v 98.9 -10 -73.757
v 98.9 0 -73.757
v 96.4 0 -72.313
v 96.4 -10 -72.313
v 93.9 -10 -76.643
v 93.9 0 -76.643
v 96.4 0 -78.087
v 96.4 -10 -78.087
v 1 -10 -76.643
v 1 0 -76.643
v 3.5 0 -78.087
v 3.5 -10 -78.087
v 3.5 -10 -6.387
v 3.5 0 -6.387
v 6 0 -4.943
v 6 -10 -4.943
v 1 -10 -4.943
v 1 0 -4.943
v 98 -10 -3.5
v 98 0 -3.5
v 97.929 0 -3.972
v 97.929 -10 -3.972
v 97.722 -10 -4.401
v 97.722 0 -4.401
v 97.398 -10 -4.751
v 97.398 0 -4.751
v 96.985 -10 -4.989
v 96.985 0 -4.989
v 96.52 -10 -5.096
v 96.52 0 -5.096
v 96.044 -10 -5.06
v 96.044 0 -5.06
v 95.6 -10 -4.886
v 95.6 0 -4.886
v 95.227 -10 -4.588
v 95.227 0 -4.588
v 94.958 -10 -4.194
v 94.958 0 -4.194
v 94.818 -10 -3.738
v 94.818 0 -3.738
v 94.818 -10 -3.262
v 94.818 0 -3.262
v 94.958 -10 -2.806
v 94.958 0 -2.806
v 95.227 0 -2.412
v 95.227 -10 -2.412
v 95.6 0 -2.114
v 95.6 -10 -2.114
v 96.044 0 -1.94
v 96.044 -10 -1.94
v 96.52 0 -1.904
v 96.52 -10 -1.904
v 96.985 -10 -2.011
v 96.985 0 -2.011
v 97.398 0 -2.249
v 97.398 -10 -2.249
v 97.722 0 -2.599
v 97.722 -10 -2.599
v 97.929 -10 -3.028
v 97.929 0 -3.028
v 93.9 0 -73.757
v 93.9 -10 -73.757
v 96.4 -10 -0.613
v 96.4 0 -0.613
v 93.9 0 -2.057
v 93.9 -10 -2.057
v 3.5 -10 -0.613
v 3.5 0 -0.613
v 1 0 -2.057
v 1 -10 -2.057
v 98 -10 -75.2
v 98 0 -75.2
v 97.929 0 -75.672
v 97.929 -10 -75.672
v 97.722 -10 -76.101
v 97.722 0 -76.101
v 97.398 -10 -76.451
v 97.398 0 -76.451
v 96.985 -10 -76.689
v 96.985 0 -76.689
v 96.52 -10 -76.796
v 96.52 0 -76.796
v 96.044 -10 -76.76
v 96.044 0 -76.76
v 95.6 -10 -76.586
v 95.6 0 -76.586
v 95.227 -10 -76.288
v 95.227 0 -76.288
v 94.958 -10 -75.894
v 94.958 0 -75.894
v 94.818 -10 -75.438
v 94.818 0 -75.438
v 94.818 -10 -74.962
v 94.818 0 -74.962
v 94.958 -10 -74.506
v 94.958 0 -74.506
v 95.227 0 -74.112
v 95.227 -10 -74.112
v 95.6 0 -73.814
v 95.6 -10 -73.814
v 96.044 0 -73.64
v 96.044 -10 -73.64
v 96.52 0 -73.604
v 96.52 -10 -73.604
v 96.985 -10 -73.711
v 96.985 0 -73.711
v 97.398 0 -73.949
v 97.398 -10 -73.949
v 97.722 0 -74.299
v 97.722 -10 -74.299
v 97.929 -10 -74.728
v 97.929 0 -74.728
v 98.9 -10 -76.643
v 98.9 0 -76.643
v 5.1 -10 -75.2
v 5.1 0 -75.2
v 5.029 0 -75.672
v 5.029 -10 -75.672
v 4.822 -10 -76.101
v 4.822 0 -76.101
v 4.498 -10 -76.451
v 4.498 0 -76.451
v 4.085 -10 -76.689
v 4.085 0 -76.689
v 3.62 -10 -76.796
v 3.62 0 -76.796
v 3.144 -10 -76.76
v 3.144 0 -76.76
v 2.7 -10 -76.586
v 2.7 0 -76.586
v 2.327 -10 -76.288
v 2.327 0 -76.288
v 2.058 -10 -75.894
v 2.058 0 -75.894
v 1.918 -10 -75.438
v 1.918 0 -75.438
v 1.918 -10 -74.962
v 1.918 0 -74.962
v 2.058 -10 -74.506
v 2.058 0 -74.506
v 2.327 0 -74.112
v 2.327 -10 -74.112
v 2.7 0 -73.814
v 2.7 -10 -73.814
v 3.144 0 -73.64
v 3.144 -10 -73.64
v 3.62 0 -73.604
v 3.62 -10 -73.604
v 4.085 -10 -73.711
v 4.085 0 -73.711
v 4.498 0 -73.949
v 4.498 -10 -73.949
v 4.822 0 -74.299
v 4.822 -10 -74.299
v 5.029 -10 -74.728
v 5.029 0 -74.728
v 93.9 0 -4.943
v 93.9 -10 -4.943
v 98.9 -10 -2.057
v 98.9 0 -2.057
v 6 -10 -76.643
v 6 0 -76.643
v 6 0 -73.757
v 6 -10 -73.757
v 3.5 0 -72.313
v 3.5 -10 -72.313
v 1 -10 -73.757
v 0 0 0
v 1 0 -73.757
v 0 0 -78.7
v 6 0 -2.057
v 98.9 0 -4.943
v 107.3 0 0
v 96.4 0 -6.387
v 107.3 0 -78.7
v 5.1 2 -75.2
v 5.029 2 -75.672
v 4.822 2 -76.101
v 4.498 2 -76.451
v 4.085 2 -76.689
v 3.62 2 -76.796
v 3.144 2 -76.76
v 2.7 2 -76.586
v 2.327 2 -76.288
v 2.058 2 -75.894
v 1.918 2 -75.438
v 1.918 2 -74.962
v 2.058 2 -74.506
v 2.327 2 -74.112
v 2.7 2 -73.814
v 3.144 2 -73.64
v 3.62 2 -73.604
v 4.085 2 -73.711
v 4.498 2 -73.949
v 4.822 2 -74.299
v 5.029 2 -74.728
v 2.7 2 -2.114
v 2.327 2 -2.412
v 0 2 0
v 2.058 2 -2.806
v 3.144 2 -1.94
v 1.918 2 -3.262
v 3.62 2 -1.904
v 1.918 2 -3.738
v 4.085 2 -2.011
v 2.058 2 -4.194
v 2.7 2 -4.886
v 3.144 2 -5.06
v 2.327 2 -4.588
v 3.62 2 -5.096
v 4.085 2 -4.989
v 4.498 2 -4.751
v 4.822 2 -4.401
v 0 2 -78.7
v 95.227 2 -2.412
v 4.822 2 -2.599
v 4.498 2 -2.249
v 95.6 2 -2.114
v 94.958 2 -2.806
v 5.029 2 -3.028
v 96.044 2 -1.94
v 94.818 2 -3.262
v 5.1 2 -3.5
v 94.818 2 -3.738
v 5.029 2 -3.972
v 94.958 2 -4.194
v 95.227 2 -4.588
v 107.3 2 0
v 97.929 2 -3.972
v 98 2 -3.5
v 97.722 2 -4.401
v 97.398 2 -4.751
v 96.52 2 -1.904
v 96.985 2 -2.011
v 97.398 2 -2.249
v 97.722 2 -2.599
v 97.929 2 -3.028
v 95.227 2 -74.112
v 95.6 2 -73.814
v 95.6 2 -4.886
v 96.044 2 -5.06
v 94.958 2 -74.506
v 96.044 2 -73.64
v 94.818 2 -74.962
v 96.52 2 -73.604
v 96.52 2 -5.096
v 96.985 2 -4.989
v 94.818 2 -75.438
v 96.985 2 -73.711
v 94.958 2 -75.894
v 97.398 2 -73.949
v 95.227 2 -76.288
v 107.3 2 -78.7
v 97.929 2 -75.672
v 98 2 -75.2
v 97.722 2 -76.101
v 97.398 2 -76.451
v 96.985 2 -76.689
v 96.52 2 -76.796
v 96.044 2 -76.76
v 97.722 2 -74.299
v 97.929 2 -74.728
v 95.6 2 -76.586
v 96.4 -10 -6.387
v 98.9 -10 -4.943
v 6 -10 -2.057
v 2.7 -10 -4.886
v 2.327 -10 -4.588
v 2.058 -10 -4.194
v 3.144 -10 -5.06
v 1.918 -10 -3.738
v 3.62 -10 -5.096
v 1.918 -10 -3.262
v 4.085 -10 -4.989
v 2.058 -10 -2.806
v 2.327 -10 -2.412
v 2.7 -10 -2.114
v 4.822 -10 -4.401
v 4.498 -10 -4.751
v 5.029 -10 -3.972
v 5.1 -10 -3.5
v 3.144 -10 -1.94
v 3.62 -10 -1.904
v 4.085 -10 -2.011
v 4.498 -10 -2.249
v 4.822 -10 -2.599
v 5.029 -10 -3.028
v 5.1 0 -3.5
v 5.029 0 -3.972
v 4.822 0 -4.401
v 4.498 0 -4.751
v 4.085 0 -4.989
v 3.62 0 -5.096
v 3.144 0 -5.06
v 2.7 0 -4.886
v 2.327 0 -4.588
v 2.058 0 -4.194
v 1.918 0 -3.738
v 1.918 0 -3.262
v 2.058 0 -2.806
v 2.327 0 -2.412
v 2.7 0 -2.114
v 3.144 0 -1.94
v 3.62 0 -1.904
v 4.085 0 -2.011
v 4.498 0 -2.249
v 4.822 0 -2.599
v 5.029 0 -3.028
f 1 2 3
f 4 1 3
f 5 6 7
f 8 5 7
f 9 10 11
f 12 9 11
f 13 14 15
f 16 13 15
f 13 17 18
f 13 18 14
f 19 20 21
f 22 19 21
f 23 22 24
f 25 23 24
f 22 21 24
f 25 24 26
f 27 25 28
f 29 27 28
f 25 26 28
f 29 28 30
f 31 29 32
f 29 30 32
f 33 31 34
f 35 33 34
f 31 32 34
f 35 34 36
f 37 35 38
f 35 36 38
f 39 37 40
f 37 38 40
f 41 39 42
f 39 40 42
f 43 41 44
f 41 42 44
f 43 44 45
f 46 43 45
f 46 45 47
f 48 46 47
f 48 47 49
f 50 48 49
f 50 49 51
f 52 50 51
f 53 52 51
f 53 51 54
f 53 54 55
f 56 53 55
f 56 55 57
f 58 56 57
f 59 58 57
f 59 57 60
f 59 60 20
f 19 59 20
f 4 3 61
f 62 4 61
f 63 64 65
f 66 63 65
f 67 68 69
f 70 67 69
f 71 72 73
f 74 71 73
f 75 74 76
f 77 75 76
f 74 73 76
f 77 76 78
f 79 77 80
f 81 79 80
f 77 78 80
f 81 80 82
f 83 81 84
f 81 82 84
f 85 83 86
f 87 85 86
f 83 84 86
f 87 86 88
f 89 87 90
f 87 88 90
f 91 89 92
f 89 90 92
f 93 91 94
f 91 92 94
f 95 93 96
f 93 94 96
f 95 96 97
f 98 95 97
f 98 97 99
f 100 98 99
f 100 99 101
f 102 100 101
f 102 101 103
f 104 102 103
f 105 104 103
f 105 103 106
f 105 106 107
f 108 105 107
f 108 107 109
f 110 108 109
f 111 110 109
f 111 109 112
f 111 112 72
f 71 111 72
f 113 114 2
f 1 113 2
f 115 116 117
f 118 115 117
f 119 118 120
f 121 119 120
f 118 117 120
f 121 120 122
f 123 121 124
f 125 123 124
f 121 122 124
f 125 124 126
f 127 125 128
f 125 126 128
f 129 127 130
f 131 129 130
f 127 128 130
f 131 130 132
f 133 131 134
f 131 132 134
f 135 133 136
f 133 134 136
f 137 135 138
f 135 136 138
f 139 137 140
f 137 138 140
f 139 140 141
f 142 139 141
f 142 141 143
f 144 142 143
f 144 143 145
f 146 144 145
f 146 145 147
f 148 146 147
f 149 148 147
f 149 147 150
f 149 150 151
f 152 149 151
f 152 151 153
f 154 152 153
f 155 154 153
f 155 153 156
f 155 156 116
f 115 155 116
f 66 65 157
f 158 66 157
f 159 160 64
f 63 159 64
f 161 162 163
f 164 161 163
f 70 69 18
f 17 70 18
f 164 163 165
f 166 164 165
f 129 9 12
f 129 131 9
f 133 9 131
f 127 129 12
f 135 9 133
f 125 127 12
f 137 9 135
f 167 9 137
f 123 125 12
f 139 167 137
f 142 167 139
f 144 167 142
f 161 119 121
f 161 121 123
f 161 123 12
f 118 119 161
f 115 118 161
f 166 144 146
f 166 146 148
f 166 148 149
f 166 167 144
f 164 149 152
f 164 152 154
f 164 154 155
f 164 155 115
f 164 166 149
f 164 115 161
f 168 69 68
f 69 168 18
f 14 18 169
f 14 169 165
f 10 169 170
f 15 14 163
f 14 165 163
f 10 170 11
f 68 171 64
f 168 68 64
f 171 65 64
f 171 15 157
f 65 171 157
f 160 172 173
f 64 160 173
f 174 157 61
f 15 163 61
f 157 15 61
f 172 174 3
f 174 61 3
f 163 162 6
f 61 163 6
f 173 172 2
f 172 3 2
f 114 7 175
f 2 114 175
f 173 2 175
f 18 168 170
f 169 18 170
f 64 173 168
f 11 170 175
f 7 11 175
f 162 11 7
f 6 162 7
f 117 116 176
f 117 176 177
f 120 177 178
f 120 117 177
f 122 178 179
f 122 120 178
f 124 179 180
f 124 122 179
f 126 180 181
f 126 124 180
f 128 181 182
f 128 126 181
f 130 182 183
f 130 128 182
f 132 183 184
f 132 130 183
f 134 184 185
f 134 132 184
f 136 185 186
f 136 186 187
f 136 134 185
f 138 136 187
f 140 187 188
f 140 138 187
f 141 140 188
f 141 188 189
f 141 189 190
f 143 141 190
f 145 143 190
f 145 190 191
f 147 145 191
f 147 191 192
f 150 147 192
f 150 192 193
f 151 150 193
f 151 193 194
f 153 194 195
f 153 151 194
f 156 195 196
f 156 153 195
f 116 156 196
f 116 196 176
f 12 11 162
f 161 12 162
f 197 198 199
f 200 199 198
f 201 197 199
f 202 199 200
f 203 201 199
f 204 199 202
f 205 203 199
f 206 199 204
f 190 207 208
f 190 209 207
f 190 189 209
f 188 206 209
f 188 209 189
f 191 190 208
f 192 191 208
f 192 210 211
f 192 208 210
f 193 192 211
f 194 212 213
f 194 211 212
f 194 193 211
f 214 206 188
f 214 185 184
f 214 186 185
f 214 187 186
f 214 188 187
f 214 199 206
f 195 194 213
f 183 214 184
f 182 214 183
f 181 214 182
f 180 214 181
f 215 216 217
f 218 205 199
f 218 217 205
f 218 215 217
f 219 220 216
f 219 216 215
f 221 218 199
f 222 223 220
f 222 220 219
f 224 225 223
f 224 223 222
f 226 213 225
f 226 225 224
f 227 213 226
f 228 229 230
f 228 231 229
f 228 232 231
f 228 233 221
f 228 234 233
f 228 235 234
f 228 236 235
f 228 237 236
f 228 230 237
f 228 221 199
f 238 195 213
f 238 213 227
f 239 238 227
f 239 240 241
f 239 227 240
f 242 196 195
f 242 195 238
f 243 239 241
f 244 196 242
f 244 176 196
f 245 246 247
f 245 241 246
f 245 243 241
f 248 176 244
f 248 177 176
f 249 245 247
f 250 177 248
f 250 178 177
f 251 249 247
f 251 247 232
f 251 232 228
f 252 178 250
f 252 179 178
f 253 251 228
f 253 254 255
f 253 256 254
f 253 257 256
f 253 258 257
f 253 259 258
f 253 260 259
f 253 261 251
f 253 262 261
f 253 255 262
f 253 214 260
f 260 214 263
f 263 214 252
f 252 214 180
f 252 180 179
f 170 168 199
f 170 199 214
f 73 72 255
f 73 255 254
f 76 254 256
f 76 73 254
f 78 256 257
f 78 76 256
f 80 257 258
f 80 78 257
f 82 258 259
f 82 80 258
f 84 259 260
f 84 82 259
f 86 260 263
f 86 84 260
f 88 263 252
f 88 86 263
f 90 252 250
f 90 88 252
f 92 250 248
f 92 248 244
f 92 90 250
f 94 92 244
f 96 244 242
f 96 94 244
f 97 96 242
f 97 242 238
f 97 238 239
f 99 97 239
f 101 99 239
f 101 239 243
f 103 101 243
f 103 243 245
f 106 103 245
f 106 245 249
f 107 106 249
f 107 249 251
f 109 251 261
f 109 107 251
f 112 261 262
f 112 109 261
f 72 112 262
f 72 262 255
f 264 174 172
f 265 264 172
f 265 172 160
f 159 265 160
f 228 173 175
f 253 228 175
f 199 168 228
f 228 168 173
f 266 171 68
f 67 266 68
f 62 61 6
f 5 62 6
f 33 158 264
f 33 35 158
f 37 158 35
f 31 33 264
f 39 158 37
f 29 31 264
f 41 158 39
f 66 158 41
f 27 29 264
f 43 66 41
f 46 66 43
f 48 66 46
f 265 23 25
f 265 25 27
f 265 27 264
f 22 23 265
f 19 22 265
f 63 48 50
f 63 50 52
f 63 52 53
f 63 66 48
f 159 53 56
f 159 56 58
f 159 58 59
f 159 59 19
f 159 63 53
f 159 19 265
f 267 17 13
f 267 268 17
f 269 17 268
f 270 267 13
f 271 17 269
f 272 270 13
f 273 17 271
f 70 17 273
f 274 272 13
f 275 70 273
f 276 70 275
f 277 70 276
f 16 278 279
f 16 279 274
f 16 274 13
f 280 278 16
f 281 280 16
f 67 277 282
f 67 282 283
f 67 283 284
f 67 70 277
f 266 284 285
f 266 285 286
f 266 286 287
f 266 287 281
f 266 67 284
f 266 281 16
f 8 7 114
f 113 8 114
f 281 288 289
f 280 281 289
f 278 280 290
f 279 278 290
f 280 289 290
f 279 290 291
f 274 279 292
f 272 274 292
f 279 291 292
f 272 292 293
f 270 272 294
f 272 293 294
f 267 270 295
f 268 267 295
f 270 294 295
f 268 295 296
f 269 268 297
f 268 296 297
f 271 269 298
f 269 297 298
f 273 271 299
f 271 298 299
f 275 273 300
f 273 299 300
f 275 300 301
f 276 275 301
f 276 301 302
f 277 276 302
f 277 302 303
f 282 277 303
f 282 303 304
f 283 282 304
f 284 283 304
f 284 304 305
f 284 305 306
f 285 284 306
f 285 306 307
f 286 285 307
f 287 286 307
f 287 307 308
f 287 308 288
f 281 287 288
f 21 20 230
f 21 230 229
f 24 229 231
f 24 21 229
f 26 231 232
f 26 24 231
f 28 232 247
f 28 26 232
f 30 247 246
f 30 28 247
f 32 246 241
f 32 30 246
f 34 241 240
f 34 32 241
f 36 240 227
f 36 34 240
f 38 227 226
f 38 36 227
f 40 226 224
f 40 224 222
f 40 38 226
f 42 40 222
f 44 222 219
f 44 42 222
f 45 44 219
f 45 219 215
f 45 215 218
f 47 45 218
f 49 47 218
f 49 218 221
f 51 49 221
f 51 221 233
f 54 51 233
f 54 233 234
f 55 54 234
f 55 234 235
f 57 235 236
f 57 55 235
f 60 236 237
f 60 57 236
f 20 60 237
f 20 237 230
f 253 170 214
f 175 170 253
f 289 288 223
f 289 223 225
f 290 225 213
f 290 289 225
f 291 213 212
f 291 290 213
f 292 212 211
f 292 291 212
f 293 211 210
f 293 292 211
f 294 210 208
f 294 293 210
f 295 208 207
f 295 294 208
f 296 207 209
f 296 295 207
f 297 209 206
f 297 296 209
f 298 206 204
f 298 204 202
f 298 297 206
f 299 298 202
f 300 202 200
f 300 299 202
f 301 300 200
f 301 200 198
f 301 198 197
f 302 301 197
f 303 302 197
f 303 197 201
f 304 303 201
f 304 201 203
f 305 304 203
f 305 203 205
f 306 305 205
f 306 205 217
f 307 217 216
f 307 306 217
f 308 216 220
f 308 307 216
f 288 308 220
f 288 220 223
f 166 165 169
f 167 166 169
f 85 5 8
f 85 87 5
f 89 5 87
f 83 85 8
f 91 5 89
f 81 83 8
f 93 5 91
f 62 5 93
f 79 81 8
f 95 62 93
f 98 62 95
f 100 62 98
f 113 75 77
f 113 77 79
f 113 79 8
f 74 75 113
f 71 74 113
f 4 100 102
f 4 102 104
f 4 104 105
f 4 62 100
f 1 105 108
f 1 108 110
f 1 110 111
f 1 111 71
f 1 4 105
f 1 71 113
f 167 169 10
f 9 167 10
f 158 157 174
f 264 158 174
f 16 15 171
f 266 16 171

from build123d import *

# Parameters (mm, degrees)
SKETCH_1_W          = 107.3
SKETCH_1_H          = 78.7
SKETCH_1_R          = 1.6
EXTRUDE_1_DEPTH     = 2
EXTRUDE_2_DEPTH     = 10
SKETCH_3_R          = 1.6
CUT_EXTRUDE_1_DEPTH = 11


with BuildPart() as part:
    # Эскиз1 → Бобышка-Вытянуть1 (new body)
    with BuildSketch(Plane(origin=(0, 0, 0), x_dir=(1, 0, 0), z_dir=(0, 1, 0))):
        with Locations((53.65, 39.35)):
            Rectangle(SKETCH_1_W, SKETCH_1_H)
        with Locations((3.5, 75.2)):
            Circle(SKETCH_1_R, mode=Mode.SUBTRACT)
        with Locations((96.4, 75.2)):
            Circle(SKETCH_1_R, mode=Mode.SUBTRACT)
        with Locations((96.4, 3.5)):
            Circle(SKETCH_1_R, mode=Mode.SUBTRACT)
        with Locations((3.5, 3.5)):
            Circle(SKETCH_1_R, mode=Mode.SUBTRACT)
    extrude(amount=EXTRUDE_1_DEPTH)

    # Эскиз2 → Бобышка-Вытянуть2 (add)
    with BuildSketch(Plane.XZ):
        Polygon((93.9, -4.943375673), (96.4, -6.386751346), (98.9, -4.943375673), (98.9, -2.056624327), (96.4, -0.613248654), (93.9, -2.056624327), align=None)
        Polygon((93.9, -76.643375673), (96.4, -78.086751346), (98.9, -76.643375673), (98.9, -73.756624327), (96.4, -72.313248654), (93.9, -73.756624327), align=None)
        Polygon((3.5, -6.386751346), (6, -4.943375673), (6, -2.056624327), (3.5, -0.613248654), (1, -2.056624327), (1, -4.943375673), align=None)
        Polygon((3.5, -72.313248654), (1, -73.756624327), (1, -76.643375673), (3.5, -78.086751346), (6, -76.643375673), (6, -73.756624327), align=None)
    extrude(amount=EXTRUDE_2_DEPTH)

    # Эскиз3 → Вырез-Вытянуть1 (cut, through all)
    with BuildSketch(Plane(origin=(0, 0, 0), x_dir=(1, 0, 0), z_dir=(0, 1, 0))):
        with Locations((3.5, 3.5)):
            Circle(SKETCH_3_R)
        with Locations((3.5, 75.2)):
            Circle(SKETCH_3_R)
        with Locations((96.4, 75.2)):
            Circle(SKETCH_3_R)
        with Locations((96.4, 3.5)):
            Circle(SKETCH_3_R)
    extrude(amount=-CUT_EXTRUDE_1_DEPTH, mode=Mode.SUBTRACT)


solid = part.part
